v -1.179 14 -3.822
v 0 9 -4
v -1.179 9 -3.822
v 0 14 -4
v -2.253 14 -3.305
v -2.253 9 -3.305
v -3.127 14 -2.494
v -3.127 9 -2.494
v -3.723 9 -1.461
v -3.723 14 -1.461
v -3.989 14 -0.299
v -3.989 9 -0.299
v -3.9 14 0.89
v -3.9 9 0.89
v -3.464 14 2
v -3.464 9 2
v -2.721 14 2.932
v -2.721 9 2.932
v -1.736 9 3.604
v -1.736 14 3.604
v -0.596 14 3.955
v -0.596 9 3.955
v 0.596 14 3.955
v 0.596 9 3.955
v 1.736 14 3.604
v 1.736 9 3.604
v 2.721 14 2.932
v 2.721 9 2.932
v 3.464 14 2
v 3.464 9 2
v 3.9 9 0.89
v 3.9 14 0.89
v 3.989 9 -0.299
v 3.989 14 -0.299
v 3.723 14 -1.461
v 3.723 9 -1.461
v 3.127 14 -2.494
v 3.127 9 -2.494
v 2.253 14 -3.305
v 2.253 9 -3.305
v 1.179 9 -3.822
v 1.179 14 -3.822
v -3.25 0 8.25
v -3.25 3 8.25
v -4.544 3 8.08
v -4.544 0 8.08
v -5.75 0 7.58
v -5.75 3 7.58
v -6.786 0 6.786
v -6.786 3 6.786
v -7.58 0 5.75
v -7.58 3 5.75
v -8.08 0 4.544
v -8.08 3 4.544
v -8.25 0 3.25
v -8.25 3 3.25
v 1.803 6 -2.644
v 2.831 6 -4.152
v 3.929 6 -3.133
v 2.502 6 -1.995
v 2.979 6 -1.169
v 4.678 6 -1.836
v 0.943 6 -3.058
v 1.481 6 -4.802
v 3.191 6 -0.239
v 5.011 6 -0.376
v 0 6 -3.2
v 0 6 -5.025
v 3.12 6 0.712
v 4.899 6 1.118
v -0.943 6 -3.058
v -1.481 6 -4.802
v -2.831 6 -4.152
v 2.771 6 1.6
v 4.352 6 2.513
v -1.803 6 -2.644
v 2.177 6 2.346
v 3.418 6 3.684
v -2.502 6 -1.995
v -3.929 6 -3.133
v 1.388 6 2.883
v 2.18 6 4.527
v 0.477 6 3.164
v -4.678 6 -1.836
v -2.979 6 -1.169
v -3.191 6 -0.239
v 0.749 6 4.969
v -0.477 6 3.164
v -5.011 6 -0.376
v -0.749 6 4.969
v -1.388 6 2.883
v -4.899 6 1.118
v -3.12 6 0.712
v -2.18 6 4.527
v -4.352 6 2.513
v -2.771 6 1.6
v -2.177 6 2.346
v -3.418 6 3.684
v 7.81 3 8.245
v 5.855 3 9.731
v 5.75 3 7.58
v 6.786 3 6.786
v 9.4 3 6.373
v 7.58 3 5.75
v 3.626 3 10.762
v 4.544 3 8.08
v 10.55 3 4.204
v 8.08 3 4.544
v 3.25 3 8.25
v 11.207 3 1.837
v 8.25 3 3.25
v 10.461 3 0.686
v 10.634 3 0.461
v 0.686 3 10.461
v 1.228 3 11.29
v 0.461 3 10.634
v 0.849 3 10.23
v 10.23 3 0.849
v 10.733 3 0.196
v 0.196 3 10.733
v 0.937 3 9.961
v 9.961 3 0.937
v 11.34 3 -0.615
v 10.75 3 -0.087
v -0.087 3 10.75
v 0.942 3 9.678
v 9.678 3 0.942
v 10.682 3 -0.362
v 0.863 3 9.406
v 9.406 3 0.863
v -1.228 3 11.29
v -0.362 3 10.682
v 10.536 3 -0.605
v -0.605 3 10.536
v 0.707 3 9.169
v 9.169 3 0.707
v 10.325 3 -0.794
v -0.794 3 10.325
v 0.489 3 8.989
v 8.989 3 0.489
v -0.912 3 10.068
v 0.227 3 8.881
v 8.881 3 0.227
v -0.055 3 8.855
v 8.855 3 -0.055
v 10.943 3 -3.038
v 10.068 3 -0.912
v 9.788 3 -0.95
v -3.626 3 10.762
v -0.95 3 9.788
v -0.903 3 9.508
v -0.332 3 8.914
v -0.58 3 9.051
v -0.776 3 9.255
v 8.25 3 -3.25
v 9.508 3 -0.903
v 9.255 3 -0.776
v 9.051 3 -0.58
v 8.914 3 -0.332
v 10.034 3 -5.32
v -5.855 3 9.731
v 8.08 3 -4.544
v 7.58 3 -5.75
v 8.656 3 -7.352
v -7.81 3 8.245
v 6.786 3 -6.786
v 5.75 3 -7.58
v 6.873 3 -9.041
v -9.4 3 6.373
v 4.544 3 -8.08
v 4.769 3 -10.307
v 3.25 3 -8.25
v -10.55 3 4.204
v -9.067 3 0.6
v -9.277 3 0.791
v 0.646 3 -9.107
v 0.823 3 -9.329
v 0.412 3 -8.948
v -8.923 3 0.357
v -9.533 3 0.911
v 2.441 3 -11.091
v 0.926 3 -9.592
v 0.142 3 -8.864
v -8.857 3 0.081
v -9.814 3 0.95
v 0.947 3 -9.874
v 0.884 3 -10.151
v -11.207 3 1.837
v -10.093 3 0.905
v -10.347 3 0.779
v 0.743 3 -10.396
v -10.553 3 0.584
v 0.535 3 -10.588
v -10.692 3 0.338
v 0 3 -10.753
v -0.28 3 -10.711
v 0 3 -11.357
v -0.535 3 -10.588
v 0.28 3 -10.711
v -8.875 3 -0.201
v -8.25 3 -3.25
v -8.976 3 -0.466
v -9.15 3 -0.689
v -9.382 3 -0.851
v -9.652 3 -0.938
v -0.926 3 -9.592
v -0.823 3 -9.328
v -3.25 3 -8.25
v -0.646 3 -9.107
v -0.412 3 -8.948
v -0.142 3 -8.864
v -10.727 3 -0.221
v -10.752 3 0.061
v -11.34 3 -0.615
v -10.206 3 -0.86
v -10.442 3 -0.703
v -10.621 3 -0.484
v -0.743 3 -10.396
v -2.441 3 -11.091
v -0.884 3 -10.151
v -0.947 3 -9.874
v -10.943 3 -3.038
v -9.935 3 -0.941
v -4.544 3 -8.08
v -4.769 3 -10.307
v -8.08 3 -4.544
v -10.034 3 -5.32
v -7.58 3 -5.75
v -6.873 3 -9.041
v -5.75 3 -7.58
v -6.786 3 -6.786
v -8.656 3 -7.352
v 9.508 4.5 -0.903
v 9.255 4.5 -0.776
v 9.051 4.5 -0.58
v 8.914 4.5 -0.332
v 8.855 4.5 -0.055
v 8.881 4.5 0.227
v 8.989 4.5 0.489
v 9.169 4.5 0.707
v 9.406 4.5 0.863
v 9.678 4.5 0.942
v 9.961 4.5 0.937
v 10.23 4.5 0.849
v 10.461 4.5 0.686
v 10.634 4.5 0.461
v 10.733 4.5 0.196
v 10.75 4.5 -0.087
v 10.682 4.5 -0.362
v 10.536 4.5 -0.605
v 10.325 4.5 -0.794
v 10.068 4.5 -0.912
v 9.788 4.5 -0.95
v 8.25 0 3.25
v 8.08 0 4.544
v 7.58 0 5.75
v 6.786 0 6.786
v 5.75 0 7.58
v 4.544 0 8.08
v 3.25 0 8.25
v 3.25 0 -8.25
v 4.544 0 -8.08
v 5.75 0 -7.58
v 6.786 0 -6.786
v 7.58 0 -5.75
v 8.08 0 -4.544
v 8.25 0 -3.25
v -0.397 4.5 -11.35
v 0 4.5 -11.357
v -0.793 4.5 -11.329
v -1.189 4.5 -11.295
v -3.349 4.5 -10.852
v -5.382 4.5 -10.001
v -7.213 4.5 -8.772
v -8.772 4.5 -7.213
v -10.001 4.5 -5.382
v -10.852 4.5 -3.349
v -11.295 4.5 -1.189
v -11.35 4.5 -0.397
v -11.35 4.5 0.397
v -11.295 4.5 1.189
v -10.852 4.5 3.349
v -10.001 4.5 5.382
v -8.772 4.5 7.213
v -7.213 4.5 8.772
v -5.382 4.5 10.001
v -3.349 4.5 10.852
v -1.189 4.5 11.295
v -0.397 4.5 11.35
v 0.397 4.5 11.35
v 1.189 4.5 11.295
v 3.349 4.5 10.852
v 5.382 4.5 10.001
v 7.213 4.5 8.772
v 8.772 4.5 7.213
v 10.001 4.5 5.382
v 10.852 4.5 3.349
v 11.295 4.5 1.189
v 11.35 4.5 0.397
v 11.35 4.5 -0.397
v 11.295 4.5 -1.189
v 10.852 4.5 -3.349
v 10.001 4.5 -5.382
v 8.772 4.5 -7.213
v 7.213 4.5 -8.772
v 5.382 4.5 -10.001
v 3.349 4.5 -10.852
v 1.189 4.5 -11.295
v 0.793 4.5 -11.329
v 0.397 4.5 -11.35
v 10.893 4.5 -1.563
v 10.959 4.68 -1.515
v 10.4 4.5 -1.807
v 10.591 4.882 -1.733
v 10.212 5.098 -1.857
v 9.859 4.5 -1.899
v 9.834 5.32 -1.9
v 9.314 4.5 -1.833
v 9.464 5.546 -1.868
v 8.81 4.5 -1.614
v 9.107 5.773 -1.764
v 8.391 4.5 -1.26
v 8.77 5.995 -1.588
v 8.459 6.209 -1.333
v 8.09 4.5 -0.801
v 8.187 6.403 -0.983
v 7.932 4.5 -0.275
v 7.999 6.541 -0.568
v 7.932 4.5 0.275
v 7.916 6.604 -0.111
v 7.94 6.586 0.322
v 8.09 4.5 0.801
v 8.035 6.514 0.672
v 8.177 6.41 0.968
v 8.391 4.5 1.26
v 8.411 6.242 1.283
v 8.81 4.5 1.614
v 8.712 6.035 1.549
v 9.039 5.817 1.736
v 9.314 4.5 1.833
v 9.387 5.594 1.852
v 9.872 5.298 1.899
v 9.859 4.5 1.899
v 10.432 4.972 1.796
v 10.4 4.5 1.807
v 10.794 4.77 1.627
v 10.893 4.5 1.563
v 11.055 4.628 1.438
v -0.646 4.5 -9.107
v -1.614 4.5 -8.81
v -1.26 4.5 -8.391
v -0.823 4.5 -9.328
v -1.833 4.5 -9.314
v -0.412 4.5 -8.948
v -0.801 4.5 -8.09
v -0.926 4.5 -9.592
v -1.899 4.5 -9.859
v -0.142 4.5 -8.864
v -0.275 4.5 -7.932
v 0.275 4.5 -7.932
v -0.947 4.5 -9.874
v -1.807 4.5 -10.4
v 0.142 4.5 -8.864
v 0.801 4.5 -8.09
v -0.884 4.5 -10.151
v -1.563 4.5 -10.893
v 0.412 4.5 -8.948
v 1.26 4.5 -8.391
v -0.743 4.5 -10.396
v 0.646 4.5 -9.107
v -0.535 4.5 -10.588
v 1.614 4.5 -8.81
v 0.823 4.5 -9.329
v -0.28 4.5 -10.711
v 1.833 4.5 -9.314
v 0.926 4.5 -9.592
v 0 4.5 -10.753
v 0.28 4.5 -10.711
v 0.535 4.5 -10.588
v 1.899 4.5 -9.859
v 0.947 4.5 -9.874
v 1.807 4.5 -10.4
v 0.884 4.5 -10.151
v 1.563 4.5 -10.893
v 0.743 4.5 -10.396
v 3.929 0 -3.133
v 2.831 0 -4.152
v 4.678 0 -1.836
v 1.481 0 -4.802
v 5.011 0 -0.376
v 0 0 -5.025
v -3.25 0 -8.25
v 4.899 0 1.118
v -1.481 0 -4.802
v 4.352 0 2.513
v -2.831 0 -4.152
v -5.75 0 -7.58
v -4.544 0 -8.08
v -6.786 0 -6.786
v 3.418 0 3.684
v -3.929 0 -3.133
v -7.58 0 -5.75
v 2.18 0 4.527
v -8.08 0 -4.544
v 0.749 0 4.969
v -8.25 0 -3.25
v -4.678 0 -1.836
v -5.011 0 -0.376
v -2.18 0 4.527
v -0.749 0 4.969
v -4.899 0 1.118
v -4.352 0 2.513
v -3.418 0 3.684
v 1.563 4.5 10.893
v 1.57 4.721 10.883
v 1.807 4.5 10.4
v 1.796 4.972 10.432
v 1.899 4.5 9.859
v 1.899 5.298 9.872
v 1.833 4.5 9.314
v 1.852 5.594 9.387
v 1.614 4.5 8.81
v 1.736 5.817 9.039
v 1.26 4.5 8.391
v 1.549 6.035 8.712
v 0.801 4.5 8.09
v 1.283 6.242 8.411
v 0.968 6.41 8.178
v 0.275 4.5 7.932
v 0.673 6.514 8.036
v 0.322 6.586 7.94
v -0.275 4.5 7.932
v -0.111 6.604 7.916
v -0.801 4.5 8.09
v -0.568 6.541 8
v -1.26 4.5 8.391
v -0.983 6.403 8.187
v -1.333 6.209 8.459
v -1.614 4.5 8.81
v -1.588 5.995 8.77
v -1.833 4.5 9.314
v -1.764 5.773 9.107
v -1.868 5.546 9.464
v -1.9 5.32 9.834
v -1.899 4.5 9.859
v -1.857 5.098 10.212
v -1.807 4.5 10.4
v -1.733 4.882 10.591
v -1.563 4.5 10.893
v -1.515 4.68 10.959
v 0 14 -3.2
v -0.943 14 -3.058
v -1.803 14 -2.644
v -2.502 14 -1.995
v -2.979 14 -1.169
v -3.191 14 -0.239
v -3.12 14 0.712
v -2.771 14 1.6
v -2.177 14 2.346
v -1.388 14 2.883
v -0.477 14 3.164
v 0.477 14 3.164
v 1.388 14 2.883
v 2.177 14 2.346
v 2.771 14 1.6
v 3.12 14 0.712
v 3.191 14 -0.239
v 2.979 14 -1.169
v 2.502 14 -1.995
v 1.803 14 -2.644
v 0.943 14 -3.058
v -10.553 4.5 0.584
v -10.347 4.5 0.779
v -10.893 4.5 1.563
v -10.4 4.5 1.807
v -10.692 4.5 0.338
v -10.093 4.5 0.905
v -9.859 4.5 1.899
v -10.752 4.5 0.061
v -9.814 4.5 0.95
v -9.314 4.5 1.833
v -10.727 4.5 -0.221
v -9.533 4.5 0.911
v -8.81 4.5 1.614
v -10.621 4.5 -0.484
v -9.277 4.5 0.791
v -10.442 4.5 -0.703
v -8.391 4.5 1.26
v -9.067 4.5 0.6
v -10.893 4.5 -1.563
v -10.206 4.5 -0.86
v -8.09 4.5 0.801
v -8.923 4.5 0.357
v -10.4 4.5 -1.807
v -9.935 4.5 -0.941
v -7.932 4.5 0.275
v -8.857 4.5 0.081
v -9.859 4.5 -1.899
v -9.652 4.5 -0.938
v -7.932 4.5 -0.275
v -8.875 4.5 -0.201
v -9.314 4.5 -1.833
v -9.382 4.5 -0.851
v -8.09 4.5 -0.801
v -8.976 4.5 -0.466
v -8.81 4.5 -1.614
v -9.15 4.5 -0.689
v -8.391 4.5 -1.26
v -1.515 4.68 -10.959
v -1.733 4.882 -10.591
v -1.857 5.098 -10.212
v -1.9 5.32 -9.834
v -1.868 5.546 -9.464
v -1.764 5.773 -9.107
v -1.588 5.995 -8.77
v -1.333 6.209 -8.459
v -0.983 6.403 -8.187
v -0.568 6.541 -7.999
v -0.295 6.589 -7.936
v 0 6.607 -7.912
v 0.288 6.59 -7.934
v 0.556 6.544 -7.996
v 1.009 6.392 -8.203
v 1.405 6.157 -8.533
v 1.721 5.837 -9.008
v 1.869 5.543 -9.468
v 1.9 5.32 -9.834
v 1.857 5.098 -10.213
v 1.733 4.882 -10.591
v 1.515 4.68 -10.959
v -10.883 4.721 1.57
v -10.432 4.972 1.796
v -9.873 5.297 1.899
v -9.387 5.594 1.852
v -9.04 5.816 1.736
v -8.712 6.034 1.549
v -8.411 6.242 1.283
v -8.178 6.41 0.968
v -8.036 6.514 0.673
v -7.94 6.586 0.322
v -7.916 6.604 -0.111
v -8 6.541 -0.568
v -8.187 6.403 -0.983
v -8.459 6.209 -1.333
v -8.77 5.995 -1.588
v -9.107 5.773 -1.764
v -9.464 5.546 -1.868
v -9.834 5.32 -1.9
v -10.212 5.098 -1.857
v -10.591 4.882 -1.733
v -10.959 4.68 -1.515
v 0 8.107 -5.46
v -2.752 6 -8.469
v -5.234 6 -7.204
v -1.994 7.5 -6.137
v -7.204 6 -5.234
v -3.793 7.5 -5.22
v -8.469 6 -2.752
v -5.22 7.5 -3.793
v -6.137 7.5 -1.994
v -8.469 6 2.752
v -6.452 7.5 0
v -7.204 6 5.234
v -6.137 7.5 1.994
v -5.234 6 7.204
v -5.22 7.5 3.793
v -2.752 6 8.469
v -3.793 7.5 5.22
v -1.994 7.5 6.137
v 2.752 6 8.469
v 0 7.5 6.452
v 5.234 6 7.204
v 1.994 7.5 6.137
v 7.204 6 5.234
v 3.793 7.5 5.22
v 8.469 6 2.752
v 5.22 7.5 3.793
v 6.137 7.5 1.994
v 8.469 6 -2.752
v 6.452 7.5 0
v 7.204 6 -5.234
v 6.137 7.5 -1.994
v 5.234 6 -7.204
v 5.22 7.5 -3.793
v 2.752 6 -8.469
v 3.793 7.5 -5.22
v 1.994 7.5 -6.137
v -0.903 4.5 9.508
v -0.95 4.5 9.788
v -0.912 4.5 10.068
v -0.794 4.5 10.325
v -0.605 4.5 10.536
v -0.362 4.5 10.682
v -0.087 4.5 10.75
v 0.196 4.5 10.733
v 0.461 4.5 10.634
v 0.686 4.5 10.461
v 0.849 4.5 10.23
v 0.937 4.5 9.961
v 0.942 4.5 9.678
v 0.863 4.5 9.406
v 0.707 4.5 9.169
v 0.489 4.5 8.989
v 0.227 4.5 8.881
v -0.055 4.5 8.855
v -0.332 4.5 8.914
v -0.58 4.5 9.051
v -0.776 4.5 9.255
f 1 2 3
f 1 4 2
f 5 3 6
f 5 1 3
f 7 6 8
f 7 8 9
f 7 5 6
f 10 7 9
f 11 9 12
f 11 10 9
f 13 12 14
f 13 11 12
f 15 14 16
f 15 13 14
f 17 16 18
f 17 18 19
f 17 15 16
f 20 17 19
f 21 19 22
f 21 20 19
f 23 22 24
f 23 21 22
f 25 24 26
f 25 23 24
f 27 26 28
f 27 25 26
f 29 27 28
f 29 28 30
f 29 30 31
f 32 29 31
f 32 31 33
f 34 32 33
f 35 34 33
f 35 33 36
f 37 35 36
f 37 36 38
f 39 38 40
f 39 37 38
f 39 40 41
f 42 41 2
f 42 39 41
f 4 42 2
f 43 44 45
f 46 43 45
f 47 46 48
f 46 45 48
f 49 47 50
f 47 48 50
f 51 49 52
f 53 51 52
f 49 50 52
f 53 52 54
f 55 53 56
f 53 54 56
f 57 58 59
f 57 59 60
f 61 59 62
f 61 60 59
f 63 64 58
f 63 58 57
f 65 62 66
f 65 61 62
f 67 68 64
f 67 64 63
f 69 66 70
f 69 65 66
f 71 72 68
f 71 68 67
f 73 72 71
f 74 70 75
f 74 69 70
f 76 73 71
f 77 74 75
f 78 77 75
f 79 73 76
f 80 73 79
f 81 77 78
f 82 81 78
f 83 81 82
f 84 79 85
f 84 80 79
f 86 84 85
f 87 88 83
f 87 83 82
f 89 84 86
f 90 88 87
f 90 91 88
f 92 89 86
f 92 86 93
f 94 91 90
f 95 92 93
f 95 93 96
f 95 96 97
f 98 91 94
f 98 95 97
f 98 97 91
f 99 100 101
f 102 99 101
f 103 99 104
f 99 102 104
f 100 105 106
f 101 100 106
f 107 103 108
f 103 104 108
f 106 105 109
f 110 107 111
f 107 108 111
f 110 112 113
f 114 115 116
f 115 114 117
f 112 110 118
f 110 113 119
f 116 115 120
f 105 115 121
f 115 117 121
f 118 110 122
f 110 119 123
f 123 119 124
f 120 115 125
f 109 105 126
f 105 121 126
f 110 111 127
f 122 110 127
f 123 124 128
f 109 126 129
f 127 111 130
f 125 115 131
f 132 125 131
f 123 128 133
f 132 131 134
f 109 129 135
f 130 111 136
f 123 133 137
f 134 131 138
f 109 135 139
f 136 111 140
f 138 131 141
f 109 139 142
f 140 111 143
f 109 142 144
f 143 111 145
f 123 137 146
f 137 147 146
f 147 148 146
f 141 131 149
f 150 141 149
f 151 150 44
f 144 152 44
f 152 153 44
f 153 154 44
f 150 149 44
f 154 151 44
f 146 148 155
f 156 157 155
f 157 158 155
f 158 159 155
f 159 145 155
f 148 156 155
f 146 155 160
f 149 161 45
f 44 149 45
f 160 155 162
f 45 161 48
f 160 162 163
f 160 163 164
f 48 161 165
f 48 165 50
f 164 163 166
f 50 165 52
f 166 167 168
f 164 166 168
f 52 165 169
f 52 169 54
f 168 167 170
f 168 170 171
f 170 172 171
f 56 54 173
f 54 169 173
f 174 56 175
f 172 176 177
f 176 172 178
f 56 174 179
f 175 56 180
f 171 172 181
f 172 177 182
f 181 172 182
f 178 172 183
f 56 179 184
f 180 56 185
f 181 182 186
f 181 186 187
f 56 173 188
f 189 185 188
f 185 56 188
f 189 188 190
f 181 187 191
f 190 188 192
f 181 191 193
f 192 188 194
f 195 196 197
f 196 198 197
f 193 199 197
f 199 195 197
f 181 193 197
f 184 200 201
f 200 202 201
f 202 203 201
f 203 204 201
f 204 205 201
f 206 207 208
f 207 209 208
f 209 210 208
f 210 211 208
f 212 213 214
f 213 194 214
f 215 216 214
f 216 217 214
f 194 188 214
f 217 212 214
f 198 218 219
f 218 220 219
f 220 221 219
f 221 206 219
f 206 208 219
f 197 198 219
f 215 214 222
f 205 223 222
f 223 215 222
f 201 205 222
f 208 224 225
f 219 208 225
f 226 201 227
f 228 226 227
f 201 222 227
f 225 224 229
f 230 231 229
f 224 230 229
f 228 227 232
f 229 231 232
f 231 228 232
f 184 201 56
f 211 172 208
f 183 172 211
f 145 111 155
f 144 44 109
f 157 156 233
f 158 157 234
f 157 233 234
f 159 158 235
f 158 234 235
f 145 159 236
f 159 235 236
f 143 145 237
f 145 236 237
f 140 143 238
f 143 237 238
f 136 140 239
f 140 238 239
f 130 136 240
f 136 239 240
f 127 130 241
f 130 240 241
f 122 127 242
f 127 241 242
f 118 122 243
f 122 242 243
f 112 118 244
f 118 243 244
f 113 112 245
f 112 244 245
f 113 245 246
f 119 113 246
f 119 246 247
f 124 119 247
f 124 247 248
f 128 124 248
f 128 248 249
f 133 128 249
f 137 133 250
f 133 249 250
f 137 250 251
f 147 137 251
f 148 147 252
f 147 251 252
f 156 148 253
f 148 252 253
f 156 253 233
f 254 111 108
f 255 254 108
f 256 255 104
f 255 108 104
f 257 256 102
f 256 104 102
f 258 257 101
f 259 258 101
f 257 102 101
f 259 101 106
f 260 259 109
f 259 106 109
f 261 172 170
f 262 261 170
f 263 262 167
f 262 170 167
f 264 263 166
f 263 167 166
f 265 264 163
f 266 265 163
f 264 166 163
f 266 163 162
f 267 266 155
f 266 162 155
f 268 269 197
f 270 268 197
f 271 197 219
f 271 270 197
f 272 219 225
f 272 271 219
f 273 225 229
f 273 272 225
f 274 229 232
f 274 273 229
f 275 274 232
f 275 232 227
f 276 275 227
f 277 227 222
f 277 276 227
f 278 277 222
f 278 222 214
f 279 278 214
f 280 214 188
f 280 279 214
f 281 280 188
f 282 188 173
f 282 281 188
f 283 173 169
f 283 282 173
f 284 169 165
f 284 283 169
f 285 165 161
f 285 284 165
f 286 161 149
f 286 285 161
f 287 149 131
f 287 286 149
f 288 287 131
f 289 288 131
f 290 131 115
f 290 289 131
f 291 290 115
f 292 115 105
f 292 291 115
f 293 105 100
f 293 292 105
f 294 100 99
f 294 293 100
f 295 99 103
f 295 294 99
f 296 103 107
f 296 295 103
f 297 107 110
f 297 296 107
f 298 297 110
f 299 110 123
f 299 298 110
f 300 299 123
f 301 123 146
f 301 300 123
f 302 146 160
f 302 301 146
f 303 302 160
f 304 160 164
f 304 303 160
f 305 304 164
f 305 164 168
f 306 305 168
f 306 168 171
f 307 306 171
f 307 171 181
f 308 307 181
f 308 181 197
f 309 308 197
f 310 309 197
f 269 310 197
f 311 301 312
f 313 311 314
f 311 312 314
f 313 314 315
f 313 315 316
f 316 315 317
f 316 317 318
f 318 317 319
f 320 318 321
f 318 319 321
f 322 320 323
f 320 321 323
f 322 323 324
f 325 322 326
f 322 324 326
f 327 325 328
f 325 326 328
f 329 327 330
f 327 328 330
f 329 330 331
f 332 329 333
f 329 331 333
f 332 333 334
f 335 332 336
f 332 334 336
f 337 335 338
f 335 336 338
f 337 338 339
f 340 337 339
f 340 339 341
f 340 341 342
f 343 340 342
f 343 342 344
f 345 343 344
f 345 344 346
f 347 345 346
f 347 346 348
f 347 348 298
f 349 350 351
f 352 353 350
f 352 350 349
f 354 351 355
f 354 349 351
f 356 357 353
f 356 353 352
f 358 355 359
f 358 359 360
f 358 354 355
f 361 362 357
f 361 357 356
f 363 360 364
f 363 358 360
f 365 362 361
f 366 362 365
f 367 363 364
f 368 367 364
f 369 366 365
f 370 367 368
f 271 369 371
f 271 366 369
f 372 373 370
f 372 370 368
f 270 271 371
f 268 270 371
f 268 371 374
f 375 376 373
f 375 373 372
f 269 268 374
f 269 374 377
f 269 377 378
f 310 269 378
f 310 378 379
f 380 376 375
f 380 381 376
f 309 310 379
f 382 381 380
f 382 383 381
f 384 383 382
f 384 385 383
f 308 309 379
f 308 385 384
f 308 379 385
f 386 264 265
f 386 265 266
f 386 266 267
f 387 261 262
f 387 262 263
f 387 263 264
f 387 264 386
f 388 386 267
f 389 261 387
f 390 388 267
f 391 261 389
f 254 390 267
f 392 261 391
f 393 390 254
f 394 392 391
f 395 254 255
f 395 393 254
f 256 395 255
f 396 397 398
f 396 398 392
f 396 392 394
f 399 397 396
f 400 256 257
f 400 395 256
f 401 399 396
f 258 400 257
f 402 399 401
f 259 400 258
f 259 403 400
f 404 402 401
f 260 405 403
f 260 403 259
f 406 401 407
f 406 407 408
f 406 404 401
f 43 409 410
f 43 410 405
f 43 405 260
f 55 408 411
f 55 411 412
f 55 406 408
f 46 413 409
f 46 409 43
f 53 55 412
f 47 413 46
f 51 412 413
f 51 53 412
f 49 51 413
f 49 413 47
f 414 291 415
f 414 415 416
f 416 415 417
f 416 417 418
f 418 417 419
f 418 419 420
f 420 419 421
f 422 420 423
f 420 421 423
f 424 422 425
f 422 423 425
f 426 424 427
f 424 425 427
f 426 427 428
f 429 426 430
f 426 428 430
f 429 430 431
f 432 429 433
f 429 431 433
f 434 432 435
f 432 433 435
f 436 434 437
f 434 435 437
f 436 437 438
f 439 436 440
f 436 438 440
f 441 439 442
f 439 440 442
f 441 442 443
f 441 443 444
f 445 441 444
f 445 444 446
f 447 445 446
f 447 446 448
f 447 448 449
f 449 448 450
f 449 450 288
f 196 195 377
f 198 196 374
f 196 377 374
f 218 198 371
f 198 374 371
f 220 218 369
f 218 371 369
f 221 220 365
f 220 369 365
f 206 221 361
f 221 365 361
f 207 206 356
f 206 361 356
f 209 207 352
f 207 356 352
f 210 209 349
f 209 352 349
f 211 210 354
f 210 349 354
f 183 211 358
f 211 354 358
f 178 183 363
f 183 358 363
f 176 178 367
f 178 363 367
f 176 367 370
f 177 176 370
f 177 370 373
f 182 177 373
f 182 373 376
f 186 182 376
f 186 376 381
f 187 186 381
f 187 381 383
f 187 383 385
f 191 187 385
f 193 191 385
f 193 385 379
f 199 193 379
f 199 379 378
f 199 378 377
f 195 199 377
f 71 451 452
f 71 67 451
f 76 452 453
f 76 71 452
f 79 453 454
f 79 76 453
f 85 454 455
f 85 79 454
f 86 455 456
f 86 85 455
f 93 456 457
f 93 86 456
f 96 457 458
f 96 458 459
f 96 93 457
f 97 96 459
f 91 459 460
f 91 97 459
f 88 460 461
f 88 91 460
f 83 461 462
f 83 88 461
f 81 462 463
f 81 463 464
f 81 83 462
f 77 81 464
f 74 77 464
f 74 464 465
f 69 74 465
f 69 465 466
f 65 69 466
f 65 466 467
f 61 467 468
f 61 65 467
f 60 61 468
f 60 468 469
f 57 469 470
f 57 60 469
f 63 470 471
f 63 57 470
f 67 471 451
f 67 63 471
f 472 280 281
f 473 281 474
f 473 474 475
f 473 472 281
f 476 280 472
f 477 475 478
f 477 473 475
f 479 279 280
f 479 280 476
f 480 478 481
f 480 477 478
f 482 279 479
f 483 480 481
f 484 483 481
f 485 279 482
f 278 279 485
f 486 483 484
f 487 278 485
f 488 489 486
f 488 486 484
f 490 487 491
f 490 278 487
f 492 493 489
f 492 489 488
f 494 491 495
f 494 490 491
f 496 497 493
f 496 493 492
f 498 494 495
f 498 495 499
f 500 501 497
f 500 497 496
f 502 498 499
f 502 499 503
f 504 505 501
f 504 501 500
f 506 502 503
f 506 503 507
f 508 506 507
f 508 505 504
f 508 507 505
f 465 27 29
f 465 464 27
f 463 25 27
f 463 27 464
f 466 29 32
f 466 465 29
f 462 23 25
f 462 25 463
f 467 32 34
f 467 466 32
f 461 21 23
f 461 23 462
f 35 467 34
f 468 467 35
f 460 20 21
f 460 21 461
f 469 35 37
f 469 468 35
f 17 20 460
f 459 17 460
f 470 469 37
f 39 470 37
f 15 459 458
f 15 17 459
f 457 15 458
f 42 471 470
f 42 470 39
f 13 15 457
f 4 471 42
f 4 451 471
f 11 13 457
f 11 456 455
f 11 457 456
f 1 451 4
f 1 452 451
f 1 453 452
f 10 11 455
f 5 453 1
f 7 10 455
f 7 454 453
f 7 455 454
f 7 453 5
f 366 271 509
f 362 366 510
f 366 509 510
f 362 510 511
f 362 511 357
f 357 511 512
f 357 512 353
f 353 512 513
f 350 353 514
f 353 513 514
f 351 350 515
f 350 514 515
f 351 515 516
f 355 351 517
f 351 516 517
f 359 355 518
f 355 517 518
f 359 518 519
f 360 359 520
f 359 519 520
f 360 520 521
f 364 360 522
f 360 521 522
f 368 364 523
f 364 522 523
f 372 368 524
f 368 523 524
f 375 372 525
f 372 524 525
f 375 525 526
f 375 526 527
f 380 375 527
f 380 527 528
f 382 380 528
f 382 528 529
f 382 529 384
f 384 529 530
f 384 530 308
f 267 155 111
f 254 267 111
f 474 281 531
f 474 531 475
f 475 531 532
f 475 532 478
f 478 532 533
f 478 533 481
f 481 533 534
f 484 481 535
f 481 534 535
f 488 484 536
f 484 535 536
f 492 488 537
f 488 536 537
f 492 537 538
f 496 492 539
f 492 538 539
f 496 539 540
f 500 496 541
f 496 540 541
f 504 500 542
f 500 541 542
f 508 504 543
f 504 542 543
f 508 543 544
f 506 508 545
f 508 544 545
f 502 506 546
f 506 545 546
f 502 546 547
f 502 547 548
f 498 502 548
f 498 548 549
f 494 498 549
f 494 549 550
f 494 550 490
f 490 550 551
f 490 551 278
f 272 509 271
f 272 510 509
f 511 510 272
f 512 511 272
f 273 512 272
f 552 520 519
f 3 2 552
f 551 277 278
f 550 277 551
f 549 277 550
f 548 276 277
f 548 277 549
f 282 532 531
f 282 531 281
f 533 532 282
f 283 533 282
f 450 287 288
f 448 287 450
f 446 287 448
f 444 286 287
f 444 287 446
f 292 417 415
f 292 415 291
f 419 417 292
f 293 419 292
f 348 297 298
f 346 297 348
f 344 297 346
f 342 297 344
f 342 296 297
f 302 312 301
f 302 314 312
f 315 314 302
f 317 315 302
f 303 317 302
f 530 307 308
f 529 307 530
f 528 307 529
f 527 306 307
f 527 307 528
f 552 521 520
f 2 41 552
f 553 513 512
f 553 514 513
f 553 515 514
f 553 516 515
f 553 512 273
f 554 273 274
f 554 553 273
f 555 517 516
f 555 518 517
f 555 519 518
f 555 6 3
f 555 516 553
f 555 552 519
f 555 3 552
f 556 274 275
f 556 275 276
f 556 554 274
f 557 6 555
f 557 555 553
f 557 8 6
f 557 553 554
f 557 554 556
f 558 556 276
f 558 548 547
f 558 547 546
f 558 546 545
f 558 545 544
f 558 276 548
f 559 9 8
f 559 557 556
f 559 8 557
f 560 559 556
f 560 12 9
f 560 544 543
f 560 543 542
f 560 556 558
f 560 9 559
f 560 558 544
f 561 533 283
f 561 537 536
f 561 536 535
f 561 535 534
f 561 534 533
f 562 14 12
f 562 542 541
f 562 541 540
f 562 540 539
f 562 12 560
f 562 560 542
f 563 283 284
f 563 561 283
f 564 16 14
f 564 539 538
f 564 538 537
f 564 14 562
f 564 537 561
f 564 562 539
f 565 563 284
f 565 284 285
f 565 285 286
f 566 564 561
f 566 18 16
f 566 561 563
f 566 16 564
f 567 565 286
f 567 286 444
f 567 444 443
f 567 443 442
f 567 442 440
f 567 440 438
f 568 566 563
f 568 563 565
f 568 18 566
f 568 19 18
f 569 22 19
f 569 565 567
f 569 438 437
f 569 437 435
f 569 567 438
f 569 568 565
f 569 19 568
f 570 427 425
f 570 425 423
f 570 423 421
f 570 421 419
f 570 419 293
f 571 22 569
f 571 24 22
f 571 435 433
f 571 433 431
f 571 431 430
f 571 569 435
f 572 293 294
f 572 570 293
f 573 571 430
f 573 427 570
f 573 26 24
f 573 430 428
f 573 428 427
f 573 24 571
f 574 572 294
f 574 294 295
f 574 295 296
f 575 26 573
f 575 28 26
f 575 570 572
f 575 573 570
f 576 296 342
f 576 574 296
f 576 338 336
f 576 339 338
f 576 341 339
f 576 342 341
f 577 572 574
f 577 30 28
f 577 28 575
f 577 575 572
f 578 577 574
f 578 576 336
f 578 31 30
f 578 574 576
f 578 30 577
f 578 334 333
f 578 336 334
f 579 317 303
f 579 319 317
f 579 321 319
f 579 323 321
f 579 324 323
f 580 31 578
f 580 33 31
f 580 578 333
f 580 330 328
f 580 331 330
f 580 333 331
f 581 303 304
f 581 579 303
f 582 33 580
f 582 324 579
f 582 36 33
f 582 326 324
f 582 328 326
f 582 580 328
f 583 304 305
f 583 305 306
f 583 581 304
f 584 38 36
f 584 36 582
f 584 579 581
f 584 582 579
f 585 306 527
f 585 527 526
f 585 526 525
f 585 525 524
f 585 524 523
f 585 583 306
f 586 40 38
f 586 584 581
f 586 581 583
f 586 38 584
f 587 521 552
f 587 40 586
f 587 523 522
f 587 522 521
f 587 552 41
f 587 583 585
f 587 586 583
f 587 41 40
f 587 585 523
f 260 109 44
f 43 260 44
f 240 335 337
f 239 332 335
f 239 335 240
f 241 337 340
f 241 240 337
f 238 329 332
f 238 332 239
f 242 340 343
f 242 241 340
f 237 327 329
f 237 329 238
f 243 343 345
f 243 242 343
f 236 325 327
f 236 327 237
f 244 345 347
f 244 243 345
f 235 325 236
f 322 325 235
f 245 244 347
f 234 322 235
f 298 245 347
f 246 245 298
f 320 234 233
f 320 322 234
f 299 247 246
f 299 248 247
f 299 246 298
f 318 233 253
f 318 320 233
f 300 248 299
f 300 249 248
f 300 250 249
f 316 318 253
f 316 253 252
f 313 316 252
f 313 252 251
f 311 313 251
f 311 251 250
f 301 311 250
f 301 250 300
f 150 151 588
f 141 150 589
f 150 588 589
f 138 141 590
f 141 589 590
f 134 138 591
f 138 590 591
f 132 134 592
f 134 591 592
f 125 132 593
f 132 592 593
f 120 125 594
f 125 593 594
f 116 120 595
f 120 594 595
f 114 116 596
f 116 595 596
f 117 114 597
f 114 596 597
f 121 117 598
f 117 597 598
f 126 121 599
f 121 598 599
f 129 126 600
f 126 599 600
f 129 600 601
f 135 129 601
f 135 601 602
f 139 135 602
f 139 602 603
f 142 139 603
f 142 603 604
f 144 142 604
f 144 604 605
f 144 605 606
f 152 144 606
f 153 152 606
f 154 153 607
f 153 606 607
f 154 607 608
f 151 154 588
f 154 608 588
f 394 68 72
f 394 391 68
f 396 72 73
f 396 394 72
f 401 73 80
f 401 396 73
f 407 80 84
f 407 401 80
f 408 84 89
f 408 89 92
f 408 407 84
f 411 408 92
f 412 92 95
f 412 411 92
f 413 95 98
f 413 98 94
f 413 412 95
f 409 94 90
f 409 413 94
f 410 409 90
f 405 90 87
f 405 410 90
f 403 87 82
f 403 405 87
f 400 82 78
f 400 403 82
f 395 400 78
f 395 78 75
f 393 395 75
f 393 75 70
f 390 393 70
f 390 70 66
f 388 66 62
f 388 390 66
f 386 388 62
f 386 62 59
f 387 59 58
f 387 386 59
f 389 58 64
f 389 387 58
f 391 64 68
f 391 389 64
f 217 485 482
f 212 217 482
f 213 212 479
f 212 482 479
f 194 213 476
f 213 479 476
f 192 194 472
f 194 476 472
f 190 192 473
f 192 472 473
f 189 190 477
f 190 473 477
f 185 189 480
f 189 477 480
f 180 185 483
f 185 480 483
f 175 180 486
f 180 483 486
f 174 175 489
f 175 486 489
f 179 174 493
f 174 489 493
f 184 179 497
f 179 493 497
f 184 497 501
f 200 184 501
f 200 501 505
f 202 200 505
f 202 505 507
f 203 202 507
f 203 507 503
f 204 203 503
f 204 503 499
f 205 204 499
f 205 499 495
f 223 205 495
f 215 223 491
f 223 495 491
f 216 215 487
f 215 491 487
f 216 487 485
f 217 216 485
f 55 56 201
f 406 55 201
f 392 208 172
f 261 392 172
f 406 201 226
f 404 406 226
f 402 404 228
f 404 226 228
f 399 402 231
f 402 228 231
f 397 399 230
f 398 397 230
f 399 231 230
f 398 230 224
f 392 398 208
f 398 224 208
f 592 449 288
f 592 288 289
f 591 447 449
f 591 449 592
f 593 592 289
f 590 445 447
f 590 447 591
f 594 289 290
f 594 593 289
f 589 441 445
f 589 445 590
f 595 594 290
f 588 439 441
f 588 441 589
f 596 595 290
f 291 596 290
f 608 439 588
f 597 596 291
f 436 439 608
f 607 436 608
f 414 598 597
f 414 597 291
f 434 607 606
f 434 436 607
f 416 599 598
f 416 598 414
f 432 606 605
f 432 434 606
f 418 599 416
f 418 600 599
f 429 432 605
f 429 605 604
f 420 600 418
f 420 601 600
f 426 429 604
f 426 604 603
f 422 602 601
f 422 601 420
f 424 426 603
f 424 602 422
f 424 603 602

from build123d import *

# Parameters (mm, degrees)
CUT_EXTRUDE1_START = 3
SKETCH4_R          = 11.357
SKETCH4_R_2        = 0.95
CUT_EXTRUDE1_DEPTH = 3
CUT_EXTRUDE2_START = 18
SKETCH4_11_R       = 0.95
CUT_EXTRUDE2_DEPTH = 18
SKETCH5_R          = 1.9
CUT_EXTRUDE3_DEPTH = 6.875


with BuildPart() as part:
    # Sketch1 → Revolve1 (revolve)
    with BuildSketch(Plane.XY, mode=Mode.PRIVATE) as revolve1_sk:
        Polygon((-5.025, 0), (-11.357, 0), (-11.357, 4.5), (-4, 9), (-4, 14), (-3.2, 14), (-3.2, 6), (-5.025, 6), align=None)
    revolve(revolve1_sk.sketch.rotate(Axis((0, 0, 0), (0, 1, 0)), 270), axis=Axis((0, 0, 0), (0, 1, 0)))

    # Sketch4 → Cut-Extrude1 (cut)
    with BuildSketch(Plane(origin=(0, 0, 0), x_dir=(1, 0, 0), z_dir=(0, 1, 0)).offset(CUT_EXTRUDE1_START)):
        with Locations(Location((0, 0, 0), (0, 0, 90))):
            Circle(SKETCH4_R)
        with Locations(Location((-9.8035, 0, 0), (0, 0, 270))):
            Circle(SKETCH4_R_2, mode=Mode.SUBTRACT)
        with Locations(Location((0, -9.8035, 0), (0, 0, 270))):
            Circle(SKETCH4_R_2, mode=Mode.SUBTRACT)
        with BuildLine():
            ThreePointArc((-8.25, 3.25), (-6.785533906, 6.785533906), (-3.25, 8.25))
            Line((-3.25, 8.25), (0.661635478, 8.25))
            Line((0.661635478, 8.25), (3.25, 8.25))
            ThreePointArc((3.25, 8.25), (6.785533906, 6.785533906), (8.25, 3.25))
            Line((8.25, 3.25), (8.25, 0.661635478))
            Line((8.25, 0.661635478), (8.25, -3.25))
            ThreePointArc((8.25, -3.25), (6.785533906, -6.785533906), (3.25, -8.25))
            Line((3.25, -8.25), (-3.25, -8.25))
            ThreePointArc((-3.25, -8.25), (-6.785533906, -6.785533906), (-8.25, -3.25))
            Line((-8.25, -3.25), (-8.25, 0.661635478))
            Line((-8.25, 0.661635478), (-8.25, 3.25))
        make_face(mode=Mode.SUBTRACT)
        with Locations(Location((9.8035, 0, 0), (0, 0, 270))):
            Circle(SKETCH4_R_2, mode=Mode.SUBTRACT)
        with Locations(Location((0, 9.8035, 0), (0, 0, 270))):
            Circle(SKETCH4_R_2, mode=Mode.SUBTRACT)
    extrude(amount=-CUT_EXTRUDE1_DEPTH, mode=Mode.SUBTRACT)

    # Sketch4<11> → Cut-Extrude2 (cut)
    with BuildSketch(Plane(origin=(0, 0, 0), x_dir=(1, 0, 0), z_dir=(0, 1, 0)).offset(CUT_EXTRUDE2_START)):
        with Locations(Location((0, 9.8035, 0), (0, 0, 90.000000426))):
            Circle(SKETCH4_11_R)
        with Locations(Location((9.8035, 0, 0), (0, 0, 108.098639854))):
            Circle(SKETCH4_11_R)
        with Locations(Location((0, -9.8035, 0), (0, 0, 161.901360146))):
            Circle(SKETCH4_11_R)
        with Locations(Location((-9.8035, 0, 0), (0, 0, 149.382227185))):
            Circle(SKETCH4_11_R)
    extrude(amount=-CUT_EXTRUDE2_DEPTH, mode=Mode.SUBTRACT)

    # Sketch5 → Cut-Extrude3 (cut)
    with BuildSketch(Plane(origin=(0, 11.375, 0), x_dir=(1, 0, 0), z_dir=(0, 1, 0))):
        with Locations((0, 9.8125)):
            Circle(SKETCH5_R)
        with Locations((9.8125, 0)):
            Circle(SKETCH5_R)
        with Locations((0, -9.8125)):
            Circle(SKETCH5_R)
        with Locations((-9.8125, 0)):
            Circle(SKETCH5_R)
    extrude(amount=-CUT_EXTRUDE3_DEPTH, mode=Mode.SUBTRACT)


solid = part.part
